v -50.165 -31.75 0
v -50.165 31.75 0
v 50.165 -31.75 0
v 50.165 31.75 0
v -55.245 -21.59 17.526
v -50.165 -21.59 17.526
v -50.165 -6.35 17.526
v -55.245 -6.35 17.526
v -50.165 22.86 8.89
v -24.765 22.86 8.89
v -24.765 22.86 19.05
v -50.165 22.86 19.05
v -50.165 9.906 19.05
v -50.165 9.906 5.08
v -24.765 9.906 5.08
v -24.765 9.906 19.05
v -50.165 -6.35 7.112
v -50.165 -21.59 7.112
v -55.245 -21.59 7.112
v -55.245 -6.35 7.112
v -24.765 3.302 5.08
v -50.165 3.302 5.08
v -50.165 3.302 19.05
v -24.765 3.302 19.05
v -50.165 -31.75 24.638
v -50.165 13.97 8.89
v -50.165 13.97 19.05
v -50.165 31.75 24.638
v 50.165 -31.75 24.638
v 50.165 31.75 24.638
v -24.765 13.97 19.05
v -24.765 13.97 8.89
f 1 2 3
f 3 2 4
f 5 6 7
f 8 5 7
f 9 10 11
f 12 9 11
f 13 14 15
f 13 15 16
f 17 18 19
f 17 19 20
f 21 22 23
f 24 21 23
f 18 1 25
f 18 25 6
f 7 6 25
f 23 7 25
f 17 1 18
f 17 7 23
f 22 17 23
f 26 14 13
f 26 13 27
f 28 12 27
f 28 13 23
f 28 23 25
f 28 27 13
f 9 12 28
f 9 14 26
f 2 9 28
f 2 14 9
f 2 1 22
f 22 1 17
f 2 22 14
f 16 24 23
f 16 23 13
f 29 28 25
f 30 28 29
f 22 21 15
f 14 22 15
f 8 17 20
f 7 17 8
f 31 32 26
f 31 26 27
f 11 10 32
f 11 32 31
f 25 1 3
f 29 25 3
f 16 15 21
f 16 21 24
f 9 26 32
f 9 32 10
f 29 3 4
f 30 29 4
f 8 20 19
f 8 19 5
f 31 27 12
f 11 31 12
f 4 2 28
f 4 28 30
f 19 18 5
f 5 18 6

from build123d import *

# Parameters (mm, degrees)
SKETCH1_W           = 100.33
SKETCH1_H           = 63.5
BOSS_EXTRUDE1_DEPTH = 24.638
SKETCH3_W           = 10.16
SKETCH3_H           = 8.89
SKETCH3_W_2         = 13.97
SKETCH3_H_2         = 6.604
CUT_EXTRUDE1_DEPTH  = 25.4
SKETCH4_W           = 10.414
SKETCH4_H           = 15.24
BOSS_EXTRUDE2_DEPTH = 5.08


with BuildPart() as part:
    # Sketch1 → Boss-Extrude1 (new body)
    with BuildSketch(Plane.XY):
        Rectangle(SKETCH1_W, SKETCH1_H)
    extrude(amount=BOSS_EXTRUDE1_DEPTH)

    # Sketch3 → Cut-Extrude1 (cut)
    with BuildSketch(Plane.ZY.offset(50.165)):
        with Locations((13.97, 18.415)):
            Rectangle(SKETCH3_W, SKETCH3_H)
        with Locations((12.065, 6.604)):
            Rectangle(SKETCH3_W_2, SKETCH3_H_2)
    extrude(amount=-CUT_EXTRUDE1_DEPTH, mode=Mode.SUBTRACT)

    # Sketch4 → Boss-Extrude2 (add)
    with BuildSketch(Plane.ZY.offset(50.165)):
        with Locations((12.319, -13.97)):
            Rectangle(SKETCH4_W, SKETCH4_H)
    extrude(amount=BOSS_EXTRUDE2_DEPTH)


solid = part.part
